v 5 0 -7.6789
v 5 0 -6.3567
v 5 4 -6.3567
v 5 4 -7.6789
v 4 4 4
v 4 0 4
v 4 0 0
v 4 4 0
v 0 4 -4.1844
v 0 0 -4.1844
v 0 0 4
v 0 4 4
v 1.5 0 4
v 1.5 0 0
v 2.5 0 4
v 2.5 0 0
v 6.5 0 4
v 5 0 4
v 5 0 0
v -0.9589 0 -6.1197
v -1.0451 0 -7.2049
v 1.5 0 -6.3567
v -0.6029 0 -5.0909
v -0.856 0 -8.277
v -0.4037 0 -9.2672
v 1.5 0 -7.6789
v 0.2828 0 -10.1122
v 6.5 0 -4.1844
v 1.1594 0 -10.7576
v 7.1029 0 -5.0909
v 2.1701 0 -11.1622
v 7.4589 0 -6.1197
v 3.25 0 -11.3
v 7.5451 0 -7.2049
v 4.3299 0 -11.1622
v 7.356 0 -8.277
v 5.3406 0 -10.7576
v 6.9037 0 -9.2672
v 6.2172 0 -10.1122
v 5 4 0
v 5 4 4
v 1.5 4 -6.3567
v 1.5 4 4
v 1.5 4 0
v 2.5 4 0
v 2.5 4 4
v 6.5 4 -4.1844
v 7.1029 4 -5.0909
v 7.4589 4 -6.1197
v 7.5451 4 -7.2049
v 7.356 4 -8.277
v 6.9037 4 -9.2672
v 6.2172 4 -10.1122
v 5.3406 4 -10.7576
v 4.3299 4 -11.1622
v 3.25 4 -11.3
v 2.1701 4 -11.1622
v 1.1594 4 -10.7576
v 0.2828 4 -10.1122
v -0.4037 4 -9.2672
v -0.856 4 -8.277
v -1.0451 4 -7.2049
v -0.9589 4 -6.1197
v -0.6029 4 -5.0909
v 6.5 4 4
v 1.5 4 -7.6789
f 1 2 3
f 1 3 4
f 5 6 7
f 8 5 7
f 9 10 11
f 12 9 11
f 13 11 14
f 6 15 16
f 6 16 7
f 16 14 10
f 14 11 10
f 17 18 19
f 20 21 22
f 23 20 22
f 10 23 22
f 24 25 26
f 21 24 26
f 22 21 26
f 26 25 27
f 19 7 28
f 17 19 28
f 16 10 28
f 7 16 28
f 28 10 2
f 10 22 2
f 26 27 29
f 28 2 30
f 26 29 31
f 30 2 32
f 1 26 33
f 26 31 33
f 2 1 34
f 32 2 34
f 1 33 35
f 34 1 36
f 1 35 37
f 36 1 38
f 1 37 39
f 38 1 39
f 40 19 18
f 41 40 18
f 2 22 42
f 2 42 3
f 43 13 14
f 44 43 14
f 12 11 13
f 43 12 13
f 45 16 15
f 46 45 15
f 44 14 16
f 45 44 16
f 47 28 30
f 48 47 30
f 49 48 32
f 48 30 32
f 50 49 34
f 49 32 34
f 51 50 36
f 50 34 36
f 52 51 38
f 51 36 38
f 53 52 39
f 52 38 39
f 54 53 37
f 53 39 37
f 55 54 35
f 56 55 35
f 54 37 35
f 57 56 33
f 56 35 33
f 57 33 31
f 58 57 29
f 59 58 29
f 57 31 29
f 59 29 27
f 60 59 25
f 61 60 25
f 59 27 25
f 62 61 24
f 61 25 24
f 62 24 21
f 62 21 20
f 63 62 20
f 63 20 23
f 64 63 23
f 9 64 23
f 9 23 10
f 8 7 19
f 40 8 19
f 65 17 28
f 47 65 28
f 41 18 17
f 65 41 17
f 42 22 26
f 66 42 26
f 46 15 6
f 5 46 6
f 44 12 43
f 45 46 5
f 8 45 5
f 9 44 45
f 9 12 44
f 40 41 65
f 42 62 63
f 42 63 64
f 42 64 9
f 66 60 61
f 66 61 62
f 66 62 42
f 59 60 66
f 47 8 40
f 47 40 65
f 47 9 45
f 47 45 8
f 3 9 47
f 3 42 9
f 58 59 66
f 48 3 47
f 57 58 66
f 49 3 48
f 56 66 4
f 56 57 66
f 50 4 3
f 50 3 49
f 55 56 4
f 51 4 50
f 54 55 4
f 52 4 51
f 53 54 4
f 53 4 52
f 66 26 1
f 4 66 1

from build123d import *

# Parameters (mm, degrees)
SKETCH1_W           = 3.5
SKETCH1_H           = 1.322228747
BOSS_EXTRUDE1_DEPTH = 4


with BuildPart() as part:
    # Sketch1 → Boss-Extrude1 (new body)
    with BuildSketch(Plane(origin=(0, 0, 0), x_dir=(1, 0, 0), z_dir=(0, 1, 0))):
        with BuildLine():
            Line((0, 0), (0, -4))
            Line((0, -4), (1.5, -4))
            Line((1.5, -4), (1.5, 0))
            Line((1.5, 0), (2.5, 0))
            Line((2.5, 0), (2.5, -4))
            Line((2.5, -4), (4, -4))
            Line((4, -4), (4, 0))
            Line((4, 0), (5, 0))
            Line((5, 0), (5, -4))
            Line((5, -4), (6.5, -4))
            Line((6.5, -4), (6.5, 0))
            Line((6.5, 0), (6.5, 4.184418355))
            ThreePointArc((6.5, 4.184418355), (3.25, 11.3), (0, 4.184418355))
            Line((0, 4.184418355), (0, 0))
        make_face()
        with Locations((3.25, 7.017797312)):
            Rectangle(SKETCH1_W, SKETCH1_H, mode=Mode.SUBTRACT)
    extrude(amount=BOSS_EXTRUDE1_DEPTH)


solid = part.part
